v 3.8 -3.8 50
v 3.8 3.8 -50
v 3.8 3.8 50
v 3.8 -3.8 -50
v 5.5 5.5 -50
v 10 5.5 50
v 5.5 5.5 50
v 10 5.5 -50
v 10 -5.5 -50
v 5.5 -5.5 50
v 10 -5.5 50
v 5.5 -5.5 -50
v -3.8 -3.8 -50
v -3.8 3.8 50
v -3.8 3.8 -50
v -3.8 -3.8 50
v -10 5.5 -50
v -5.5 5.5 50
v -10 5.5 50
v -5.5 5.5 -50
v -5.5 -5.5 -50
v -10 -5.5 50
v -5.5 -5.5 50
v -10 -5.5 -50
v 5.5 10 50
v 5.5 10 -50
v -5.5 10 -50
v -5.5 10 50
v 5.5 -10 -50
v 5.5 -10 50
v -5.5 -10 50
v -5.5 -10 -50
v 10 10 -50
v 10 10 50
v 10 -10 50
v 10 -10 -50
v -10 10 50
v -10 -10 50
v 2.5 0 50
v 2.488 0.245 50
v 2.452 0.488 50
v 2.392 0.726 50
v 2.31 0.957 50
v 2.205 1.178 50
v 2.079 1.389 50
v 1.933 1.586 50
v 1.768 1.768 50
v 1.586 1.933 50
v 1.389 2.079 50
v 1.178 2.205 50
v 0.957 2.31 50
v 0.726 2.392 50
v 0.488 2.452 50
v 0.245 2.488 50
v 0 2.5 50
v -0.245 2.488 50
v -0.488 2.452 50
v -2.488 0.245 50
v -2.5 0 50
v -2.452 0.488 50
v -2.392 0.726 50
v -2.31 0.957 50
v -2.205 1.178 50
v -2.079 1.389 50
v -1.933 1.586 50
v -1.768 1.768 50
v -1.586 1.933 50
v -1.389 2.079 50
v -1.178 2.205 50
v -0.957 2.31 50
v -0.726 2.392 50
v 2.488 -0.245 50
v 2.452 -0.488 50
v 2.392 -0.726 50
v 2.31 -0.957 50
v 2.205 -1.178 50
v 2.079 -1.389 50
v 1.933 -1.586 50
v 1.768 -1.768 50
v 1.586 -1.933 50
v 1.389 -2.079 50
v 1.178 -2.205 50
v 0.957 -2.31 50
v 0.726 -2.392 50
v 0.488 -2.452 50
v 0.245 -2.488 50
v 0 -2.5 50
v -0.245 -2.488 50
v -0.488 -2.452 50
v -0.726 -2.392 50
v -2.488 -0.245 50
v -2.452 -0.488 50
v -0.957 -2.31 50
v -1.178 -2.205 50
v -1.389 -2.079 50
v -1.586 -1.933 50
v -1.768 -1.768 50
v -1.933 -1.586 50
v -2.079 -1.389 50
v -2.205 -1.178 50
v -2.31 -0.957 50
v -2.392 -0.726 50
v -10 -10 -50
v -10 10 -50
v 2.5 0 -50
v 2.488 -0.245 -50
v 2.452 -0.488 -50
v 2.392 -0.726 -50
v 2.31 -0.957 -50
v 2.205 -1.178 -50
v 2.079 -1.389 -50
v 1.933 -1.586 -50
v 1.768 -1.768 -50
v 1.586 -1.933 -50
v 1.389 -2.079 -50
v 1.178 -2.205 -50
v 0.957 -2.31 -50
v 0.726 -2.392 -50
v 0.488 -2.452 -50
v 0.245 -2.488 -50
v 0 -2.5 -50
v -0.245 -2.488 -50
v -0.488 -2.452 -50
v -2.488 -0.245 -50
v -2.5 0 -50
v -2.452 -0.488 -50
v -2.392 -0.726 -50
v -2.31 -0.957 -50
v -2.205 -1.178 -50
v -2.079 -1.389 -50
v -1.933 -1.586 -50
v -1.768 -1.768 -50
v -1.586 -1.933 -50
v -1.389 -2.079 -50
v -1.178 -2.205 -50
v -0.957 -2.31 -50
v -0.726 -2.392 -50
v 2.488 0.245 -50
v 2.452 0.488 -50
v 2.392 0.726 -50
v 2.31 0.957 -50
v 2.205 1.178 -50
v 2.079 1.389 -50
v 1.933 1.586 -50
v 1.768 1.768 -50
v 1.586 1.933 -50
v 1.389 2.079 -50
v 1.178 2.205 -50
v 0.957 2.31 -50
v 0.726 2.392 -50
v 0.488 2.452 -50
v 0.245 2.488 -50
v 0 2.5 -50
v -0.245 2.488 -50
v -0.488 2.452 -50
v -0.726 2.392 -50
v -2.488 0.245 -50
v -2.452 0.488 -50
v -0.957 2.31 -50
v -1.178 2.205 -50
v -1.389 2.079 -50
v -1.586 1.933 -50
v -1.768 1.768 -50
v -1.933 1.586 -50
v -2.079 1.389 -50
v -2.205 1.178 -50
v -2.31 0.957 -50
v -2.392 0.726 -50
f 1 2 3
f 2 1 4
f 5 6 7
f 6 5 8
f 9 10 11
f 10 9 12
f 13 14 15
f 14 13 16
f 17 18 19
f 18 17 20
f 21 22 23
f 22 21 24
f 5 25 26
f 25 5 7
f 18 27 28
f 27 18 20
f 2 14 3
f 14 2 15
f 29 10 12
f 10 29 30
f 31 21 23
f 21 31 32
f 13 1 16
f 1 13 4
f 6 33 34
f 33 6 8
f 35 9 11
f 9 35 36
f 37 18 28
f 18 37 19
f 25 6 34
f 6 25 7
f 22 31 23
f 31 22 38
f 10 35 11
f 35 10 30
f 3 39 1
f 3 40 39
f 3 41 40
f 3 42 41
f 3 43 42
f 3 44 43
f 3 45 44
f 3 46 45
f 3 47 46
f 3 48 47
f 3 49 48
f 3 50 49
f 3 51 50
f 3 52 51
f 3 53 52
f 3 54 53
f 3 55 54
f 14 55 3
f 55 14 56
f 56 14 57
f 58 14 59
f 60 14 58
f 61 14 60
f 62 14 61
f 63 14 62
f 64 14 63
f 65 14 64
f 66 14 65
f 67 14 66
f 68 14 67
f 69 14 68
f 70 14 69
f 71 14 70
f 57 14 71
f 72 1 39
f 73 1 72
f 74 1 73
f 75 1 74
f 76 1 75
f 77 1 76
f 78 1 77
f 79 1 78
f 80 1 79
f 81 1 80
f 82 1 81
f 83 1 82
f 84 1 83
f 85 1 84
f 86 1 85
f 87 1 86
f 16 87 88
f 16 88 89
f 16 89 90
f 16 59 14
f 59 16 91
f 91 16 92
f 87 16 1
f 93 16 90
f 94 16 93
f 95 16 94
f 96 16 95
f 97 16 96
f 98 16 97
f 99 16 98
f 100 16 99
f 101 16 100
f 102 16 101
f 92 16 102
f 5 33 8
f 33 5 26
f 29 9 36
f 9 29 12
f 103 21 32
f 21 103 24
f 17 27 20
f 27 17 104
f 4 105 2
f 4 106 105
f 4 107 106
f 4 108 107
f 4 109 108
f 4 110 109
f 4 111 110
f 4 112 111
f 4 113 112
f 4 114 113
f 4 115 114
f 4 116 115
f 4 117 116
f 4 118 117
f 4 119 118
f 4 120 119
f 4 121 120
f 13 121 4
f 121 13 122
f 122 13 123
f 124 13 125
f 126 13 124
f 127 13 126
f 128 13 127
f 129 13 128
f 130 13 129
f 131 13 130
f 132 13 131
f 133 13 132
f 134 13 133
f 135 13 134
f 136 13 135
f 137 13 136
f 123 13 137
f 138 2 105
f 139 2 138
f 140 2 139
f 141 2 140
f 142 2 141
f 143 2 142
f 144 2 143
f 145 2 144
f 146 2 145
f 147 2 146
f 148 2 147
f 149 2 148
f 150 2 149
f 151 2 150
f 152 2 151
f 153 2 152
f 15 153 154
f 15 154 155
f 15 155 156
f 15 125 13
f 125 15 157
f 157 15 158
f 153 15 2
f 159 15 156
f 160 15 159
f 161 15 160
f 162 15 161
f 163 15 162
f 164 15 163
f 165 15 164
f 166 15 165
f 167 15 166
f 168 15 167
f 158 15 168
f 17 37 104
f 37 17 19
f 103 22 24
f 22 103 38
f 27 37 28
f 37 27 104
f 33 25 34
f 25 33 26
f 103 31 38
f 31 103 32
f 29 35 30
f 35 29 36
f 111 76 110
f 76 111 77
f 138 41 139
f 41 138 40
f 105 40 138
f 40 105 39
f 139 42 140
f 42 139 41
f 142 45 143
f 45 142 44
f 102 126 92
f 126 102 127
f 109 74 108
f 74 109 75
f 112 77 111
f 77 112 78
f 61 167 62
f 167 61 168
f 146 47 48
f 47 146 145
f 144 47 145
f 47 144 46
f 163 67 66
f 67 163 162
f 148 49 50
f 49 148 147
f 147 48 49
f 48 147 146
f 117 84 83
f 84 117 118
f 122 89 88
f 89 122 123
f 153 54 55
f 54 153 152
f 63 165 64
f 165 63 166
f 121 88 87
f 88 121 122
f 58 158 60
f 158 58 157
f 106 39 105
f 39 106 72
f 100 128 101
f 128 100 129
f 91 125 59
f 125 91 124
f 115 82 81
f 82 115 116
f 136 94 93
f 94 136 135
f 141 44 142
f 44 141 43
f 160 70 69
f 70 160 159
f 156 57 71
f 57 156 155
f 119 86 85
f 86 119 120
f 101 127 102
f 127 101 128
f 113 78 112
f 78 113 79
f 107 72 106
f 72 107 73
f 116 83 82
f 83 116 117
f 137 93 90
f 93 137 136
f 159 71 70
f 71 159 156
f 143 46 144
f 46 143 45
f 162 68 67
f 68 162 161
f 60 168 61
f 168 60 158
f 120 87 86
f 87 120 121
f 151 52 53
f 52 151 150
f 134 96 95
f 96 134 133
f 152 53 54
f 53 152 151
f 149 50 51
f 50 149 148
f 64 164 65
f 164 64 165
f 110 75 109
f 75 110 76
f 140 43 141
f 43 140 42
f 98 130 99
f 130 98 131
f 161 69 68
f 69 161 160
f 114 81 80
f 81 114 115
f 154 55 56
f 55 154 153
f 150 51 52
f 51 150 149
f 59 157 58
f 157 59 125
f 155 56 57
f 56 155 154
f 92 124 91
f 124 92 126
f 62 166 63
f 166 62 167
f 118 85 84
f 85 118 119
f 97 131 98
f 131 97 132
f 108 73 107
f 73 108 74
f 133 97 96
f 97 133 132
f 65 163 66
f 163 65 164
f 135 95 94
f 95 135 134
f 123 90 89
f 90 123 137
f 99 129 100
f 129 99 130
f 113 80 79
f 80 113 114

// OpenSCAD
// 20x20 T-slot aluminium extrusion (approximate 2020 profile), 100mm long
// One connected solid, no floating parts

$fn = 64;

// Parameters (mm)
cross_section_width_mm  = 20.0;
cross_section_height_mm = 20.0;
length_mm              = 100.0;

wall_thickness_mm       = 2.0;   // outer wall thickness
center_bore_diameter_mm = 5.0;   // typical 2020 center bore

// T-slot geometry (approximate)
slot_opening_width_mm = 6.0;     // mouth width at outer face
slot_neck_depth_mm    = 2.0;     // depth of narrow mouth cut
slot_cavity_width_mm  = 11.0;    // wider internal cavity width
slot_cavity_depth_mm  = 6.0;     // depth of cavity cut from outer face

overlap_mm = 0.2;                // small overlap for robust booleans

module tslot_cut_x(sign=1) {
    // Cuts a T-slot from the +X or -X face inward
    // sign = +1 for +X face, -1 for -X face
    union() {
        // Narrow mouth (near outer face)
        translate([sign*(cross_section_width_mm/2 - (slot_neck_depth_mm/2)), 0, 0])
            cube([slot_neck_depth_mm + 2*overlap_mm, slot_opening_width_mm, length_mm + 2*overlap_mm], center=true);

        // Wider cavity (deeper inside)
        translate([sign*(cross_section_width_mm/2 - (slot_cavity_depth_mm/2)), 0, 0])
            cube([slot_cavity_depth_mm + 2*overlap_mm, slot_cavity_width_mm, length_mm + 2*overlap_mm], center=true);
    }
}

module tslot_cut_y(sign=1) {
    // Cuts a T-slot from the +Y or -Y face inward
    union() {
        translate([0, sign*(cross_section_height_mm/2 - (slot_neck_depth_mm/2)), 0])
            cube([slot_opening_width_mm, slot_neck_depth_mm + 2*overlap_mm, length_mm + 2*overlap_mm], center=true);

        translate([0, sign*(cross_section_height_mm/2 - (slot_cavity_depth_mm/2)), 0])
            cube([slot_cavity_width_mm, slot_cavity_depth_mm + 2*overlap_mm, length_mm + 2*overlap_mm], center=true);
    }
}

module extrusion_2020() {
    // Build as: outer solid minus (center bore + 4 T-slots)
    // Keep enough material so the result is one connected solid.
    difference() {
        // Outer body
        cube([cross_section_width_mm, cross_section_height_mm, length_mm], center=true);

        // Center bore
        cylinder(d=center_bore_diameter_mm, h=length_mm + 2*overlap_mm, center=true);

        // Four T-slots
        tslot_cut_x(+1);
        tslot_cut_x(-1);
        tslot_cut_y(+1);
        tslot_cut_y(-1);

        // Optional: relieve the very large "square tube" void by NOT hollowing the whole interior.
        // (Intentionally omitted: no big inner cube subtraction.)
    }
}

// Render
color("Silver") extrusion_2020();
